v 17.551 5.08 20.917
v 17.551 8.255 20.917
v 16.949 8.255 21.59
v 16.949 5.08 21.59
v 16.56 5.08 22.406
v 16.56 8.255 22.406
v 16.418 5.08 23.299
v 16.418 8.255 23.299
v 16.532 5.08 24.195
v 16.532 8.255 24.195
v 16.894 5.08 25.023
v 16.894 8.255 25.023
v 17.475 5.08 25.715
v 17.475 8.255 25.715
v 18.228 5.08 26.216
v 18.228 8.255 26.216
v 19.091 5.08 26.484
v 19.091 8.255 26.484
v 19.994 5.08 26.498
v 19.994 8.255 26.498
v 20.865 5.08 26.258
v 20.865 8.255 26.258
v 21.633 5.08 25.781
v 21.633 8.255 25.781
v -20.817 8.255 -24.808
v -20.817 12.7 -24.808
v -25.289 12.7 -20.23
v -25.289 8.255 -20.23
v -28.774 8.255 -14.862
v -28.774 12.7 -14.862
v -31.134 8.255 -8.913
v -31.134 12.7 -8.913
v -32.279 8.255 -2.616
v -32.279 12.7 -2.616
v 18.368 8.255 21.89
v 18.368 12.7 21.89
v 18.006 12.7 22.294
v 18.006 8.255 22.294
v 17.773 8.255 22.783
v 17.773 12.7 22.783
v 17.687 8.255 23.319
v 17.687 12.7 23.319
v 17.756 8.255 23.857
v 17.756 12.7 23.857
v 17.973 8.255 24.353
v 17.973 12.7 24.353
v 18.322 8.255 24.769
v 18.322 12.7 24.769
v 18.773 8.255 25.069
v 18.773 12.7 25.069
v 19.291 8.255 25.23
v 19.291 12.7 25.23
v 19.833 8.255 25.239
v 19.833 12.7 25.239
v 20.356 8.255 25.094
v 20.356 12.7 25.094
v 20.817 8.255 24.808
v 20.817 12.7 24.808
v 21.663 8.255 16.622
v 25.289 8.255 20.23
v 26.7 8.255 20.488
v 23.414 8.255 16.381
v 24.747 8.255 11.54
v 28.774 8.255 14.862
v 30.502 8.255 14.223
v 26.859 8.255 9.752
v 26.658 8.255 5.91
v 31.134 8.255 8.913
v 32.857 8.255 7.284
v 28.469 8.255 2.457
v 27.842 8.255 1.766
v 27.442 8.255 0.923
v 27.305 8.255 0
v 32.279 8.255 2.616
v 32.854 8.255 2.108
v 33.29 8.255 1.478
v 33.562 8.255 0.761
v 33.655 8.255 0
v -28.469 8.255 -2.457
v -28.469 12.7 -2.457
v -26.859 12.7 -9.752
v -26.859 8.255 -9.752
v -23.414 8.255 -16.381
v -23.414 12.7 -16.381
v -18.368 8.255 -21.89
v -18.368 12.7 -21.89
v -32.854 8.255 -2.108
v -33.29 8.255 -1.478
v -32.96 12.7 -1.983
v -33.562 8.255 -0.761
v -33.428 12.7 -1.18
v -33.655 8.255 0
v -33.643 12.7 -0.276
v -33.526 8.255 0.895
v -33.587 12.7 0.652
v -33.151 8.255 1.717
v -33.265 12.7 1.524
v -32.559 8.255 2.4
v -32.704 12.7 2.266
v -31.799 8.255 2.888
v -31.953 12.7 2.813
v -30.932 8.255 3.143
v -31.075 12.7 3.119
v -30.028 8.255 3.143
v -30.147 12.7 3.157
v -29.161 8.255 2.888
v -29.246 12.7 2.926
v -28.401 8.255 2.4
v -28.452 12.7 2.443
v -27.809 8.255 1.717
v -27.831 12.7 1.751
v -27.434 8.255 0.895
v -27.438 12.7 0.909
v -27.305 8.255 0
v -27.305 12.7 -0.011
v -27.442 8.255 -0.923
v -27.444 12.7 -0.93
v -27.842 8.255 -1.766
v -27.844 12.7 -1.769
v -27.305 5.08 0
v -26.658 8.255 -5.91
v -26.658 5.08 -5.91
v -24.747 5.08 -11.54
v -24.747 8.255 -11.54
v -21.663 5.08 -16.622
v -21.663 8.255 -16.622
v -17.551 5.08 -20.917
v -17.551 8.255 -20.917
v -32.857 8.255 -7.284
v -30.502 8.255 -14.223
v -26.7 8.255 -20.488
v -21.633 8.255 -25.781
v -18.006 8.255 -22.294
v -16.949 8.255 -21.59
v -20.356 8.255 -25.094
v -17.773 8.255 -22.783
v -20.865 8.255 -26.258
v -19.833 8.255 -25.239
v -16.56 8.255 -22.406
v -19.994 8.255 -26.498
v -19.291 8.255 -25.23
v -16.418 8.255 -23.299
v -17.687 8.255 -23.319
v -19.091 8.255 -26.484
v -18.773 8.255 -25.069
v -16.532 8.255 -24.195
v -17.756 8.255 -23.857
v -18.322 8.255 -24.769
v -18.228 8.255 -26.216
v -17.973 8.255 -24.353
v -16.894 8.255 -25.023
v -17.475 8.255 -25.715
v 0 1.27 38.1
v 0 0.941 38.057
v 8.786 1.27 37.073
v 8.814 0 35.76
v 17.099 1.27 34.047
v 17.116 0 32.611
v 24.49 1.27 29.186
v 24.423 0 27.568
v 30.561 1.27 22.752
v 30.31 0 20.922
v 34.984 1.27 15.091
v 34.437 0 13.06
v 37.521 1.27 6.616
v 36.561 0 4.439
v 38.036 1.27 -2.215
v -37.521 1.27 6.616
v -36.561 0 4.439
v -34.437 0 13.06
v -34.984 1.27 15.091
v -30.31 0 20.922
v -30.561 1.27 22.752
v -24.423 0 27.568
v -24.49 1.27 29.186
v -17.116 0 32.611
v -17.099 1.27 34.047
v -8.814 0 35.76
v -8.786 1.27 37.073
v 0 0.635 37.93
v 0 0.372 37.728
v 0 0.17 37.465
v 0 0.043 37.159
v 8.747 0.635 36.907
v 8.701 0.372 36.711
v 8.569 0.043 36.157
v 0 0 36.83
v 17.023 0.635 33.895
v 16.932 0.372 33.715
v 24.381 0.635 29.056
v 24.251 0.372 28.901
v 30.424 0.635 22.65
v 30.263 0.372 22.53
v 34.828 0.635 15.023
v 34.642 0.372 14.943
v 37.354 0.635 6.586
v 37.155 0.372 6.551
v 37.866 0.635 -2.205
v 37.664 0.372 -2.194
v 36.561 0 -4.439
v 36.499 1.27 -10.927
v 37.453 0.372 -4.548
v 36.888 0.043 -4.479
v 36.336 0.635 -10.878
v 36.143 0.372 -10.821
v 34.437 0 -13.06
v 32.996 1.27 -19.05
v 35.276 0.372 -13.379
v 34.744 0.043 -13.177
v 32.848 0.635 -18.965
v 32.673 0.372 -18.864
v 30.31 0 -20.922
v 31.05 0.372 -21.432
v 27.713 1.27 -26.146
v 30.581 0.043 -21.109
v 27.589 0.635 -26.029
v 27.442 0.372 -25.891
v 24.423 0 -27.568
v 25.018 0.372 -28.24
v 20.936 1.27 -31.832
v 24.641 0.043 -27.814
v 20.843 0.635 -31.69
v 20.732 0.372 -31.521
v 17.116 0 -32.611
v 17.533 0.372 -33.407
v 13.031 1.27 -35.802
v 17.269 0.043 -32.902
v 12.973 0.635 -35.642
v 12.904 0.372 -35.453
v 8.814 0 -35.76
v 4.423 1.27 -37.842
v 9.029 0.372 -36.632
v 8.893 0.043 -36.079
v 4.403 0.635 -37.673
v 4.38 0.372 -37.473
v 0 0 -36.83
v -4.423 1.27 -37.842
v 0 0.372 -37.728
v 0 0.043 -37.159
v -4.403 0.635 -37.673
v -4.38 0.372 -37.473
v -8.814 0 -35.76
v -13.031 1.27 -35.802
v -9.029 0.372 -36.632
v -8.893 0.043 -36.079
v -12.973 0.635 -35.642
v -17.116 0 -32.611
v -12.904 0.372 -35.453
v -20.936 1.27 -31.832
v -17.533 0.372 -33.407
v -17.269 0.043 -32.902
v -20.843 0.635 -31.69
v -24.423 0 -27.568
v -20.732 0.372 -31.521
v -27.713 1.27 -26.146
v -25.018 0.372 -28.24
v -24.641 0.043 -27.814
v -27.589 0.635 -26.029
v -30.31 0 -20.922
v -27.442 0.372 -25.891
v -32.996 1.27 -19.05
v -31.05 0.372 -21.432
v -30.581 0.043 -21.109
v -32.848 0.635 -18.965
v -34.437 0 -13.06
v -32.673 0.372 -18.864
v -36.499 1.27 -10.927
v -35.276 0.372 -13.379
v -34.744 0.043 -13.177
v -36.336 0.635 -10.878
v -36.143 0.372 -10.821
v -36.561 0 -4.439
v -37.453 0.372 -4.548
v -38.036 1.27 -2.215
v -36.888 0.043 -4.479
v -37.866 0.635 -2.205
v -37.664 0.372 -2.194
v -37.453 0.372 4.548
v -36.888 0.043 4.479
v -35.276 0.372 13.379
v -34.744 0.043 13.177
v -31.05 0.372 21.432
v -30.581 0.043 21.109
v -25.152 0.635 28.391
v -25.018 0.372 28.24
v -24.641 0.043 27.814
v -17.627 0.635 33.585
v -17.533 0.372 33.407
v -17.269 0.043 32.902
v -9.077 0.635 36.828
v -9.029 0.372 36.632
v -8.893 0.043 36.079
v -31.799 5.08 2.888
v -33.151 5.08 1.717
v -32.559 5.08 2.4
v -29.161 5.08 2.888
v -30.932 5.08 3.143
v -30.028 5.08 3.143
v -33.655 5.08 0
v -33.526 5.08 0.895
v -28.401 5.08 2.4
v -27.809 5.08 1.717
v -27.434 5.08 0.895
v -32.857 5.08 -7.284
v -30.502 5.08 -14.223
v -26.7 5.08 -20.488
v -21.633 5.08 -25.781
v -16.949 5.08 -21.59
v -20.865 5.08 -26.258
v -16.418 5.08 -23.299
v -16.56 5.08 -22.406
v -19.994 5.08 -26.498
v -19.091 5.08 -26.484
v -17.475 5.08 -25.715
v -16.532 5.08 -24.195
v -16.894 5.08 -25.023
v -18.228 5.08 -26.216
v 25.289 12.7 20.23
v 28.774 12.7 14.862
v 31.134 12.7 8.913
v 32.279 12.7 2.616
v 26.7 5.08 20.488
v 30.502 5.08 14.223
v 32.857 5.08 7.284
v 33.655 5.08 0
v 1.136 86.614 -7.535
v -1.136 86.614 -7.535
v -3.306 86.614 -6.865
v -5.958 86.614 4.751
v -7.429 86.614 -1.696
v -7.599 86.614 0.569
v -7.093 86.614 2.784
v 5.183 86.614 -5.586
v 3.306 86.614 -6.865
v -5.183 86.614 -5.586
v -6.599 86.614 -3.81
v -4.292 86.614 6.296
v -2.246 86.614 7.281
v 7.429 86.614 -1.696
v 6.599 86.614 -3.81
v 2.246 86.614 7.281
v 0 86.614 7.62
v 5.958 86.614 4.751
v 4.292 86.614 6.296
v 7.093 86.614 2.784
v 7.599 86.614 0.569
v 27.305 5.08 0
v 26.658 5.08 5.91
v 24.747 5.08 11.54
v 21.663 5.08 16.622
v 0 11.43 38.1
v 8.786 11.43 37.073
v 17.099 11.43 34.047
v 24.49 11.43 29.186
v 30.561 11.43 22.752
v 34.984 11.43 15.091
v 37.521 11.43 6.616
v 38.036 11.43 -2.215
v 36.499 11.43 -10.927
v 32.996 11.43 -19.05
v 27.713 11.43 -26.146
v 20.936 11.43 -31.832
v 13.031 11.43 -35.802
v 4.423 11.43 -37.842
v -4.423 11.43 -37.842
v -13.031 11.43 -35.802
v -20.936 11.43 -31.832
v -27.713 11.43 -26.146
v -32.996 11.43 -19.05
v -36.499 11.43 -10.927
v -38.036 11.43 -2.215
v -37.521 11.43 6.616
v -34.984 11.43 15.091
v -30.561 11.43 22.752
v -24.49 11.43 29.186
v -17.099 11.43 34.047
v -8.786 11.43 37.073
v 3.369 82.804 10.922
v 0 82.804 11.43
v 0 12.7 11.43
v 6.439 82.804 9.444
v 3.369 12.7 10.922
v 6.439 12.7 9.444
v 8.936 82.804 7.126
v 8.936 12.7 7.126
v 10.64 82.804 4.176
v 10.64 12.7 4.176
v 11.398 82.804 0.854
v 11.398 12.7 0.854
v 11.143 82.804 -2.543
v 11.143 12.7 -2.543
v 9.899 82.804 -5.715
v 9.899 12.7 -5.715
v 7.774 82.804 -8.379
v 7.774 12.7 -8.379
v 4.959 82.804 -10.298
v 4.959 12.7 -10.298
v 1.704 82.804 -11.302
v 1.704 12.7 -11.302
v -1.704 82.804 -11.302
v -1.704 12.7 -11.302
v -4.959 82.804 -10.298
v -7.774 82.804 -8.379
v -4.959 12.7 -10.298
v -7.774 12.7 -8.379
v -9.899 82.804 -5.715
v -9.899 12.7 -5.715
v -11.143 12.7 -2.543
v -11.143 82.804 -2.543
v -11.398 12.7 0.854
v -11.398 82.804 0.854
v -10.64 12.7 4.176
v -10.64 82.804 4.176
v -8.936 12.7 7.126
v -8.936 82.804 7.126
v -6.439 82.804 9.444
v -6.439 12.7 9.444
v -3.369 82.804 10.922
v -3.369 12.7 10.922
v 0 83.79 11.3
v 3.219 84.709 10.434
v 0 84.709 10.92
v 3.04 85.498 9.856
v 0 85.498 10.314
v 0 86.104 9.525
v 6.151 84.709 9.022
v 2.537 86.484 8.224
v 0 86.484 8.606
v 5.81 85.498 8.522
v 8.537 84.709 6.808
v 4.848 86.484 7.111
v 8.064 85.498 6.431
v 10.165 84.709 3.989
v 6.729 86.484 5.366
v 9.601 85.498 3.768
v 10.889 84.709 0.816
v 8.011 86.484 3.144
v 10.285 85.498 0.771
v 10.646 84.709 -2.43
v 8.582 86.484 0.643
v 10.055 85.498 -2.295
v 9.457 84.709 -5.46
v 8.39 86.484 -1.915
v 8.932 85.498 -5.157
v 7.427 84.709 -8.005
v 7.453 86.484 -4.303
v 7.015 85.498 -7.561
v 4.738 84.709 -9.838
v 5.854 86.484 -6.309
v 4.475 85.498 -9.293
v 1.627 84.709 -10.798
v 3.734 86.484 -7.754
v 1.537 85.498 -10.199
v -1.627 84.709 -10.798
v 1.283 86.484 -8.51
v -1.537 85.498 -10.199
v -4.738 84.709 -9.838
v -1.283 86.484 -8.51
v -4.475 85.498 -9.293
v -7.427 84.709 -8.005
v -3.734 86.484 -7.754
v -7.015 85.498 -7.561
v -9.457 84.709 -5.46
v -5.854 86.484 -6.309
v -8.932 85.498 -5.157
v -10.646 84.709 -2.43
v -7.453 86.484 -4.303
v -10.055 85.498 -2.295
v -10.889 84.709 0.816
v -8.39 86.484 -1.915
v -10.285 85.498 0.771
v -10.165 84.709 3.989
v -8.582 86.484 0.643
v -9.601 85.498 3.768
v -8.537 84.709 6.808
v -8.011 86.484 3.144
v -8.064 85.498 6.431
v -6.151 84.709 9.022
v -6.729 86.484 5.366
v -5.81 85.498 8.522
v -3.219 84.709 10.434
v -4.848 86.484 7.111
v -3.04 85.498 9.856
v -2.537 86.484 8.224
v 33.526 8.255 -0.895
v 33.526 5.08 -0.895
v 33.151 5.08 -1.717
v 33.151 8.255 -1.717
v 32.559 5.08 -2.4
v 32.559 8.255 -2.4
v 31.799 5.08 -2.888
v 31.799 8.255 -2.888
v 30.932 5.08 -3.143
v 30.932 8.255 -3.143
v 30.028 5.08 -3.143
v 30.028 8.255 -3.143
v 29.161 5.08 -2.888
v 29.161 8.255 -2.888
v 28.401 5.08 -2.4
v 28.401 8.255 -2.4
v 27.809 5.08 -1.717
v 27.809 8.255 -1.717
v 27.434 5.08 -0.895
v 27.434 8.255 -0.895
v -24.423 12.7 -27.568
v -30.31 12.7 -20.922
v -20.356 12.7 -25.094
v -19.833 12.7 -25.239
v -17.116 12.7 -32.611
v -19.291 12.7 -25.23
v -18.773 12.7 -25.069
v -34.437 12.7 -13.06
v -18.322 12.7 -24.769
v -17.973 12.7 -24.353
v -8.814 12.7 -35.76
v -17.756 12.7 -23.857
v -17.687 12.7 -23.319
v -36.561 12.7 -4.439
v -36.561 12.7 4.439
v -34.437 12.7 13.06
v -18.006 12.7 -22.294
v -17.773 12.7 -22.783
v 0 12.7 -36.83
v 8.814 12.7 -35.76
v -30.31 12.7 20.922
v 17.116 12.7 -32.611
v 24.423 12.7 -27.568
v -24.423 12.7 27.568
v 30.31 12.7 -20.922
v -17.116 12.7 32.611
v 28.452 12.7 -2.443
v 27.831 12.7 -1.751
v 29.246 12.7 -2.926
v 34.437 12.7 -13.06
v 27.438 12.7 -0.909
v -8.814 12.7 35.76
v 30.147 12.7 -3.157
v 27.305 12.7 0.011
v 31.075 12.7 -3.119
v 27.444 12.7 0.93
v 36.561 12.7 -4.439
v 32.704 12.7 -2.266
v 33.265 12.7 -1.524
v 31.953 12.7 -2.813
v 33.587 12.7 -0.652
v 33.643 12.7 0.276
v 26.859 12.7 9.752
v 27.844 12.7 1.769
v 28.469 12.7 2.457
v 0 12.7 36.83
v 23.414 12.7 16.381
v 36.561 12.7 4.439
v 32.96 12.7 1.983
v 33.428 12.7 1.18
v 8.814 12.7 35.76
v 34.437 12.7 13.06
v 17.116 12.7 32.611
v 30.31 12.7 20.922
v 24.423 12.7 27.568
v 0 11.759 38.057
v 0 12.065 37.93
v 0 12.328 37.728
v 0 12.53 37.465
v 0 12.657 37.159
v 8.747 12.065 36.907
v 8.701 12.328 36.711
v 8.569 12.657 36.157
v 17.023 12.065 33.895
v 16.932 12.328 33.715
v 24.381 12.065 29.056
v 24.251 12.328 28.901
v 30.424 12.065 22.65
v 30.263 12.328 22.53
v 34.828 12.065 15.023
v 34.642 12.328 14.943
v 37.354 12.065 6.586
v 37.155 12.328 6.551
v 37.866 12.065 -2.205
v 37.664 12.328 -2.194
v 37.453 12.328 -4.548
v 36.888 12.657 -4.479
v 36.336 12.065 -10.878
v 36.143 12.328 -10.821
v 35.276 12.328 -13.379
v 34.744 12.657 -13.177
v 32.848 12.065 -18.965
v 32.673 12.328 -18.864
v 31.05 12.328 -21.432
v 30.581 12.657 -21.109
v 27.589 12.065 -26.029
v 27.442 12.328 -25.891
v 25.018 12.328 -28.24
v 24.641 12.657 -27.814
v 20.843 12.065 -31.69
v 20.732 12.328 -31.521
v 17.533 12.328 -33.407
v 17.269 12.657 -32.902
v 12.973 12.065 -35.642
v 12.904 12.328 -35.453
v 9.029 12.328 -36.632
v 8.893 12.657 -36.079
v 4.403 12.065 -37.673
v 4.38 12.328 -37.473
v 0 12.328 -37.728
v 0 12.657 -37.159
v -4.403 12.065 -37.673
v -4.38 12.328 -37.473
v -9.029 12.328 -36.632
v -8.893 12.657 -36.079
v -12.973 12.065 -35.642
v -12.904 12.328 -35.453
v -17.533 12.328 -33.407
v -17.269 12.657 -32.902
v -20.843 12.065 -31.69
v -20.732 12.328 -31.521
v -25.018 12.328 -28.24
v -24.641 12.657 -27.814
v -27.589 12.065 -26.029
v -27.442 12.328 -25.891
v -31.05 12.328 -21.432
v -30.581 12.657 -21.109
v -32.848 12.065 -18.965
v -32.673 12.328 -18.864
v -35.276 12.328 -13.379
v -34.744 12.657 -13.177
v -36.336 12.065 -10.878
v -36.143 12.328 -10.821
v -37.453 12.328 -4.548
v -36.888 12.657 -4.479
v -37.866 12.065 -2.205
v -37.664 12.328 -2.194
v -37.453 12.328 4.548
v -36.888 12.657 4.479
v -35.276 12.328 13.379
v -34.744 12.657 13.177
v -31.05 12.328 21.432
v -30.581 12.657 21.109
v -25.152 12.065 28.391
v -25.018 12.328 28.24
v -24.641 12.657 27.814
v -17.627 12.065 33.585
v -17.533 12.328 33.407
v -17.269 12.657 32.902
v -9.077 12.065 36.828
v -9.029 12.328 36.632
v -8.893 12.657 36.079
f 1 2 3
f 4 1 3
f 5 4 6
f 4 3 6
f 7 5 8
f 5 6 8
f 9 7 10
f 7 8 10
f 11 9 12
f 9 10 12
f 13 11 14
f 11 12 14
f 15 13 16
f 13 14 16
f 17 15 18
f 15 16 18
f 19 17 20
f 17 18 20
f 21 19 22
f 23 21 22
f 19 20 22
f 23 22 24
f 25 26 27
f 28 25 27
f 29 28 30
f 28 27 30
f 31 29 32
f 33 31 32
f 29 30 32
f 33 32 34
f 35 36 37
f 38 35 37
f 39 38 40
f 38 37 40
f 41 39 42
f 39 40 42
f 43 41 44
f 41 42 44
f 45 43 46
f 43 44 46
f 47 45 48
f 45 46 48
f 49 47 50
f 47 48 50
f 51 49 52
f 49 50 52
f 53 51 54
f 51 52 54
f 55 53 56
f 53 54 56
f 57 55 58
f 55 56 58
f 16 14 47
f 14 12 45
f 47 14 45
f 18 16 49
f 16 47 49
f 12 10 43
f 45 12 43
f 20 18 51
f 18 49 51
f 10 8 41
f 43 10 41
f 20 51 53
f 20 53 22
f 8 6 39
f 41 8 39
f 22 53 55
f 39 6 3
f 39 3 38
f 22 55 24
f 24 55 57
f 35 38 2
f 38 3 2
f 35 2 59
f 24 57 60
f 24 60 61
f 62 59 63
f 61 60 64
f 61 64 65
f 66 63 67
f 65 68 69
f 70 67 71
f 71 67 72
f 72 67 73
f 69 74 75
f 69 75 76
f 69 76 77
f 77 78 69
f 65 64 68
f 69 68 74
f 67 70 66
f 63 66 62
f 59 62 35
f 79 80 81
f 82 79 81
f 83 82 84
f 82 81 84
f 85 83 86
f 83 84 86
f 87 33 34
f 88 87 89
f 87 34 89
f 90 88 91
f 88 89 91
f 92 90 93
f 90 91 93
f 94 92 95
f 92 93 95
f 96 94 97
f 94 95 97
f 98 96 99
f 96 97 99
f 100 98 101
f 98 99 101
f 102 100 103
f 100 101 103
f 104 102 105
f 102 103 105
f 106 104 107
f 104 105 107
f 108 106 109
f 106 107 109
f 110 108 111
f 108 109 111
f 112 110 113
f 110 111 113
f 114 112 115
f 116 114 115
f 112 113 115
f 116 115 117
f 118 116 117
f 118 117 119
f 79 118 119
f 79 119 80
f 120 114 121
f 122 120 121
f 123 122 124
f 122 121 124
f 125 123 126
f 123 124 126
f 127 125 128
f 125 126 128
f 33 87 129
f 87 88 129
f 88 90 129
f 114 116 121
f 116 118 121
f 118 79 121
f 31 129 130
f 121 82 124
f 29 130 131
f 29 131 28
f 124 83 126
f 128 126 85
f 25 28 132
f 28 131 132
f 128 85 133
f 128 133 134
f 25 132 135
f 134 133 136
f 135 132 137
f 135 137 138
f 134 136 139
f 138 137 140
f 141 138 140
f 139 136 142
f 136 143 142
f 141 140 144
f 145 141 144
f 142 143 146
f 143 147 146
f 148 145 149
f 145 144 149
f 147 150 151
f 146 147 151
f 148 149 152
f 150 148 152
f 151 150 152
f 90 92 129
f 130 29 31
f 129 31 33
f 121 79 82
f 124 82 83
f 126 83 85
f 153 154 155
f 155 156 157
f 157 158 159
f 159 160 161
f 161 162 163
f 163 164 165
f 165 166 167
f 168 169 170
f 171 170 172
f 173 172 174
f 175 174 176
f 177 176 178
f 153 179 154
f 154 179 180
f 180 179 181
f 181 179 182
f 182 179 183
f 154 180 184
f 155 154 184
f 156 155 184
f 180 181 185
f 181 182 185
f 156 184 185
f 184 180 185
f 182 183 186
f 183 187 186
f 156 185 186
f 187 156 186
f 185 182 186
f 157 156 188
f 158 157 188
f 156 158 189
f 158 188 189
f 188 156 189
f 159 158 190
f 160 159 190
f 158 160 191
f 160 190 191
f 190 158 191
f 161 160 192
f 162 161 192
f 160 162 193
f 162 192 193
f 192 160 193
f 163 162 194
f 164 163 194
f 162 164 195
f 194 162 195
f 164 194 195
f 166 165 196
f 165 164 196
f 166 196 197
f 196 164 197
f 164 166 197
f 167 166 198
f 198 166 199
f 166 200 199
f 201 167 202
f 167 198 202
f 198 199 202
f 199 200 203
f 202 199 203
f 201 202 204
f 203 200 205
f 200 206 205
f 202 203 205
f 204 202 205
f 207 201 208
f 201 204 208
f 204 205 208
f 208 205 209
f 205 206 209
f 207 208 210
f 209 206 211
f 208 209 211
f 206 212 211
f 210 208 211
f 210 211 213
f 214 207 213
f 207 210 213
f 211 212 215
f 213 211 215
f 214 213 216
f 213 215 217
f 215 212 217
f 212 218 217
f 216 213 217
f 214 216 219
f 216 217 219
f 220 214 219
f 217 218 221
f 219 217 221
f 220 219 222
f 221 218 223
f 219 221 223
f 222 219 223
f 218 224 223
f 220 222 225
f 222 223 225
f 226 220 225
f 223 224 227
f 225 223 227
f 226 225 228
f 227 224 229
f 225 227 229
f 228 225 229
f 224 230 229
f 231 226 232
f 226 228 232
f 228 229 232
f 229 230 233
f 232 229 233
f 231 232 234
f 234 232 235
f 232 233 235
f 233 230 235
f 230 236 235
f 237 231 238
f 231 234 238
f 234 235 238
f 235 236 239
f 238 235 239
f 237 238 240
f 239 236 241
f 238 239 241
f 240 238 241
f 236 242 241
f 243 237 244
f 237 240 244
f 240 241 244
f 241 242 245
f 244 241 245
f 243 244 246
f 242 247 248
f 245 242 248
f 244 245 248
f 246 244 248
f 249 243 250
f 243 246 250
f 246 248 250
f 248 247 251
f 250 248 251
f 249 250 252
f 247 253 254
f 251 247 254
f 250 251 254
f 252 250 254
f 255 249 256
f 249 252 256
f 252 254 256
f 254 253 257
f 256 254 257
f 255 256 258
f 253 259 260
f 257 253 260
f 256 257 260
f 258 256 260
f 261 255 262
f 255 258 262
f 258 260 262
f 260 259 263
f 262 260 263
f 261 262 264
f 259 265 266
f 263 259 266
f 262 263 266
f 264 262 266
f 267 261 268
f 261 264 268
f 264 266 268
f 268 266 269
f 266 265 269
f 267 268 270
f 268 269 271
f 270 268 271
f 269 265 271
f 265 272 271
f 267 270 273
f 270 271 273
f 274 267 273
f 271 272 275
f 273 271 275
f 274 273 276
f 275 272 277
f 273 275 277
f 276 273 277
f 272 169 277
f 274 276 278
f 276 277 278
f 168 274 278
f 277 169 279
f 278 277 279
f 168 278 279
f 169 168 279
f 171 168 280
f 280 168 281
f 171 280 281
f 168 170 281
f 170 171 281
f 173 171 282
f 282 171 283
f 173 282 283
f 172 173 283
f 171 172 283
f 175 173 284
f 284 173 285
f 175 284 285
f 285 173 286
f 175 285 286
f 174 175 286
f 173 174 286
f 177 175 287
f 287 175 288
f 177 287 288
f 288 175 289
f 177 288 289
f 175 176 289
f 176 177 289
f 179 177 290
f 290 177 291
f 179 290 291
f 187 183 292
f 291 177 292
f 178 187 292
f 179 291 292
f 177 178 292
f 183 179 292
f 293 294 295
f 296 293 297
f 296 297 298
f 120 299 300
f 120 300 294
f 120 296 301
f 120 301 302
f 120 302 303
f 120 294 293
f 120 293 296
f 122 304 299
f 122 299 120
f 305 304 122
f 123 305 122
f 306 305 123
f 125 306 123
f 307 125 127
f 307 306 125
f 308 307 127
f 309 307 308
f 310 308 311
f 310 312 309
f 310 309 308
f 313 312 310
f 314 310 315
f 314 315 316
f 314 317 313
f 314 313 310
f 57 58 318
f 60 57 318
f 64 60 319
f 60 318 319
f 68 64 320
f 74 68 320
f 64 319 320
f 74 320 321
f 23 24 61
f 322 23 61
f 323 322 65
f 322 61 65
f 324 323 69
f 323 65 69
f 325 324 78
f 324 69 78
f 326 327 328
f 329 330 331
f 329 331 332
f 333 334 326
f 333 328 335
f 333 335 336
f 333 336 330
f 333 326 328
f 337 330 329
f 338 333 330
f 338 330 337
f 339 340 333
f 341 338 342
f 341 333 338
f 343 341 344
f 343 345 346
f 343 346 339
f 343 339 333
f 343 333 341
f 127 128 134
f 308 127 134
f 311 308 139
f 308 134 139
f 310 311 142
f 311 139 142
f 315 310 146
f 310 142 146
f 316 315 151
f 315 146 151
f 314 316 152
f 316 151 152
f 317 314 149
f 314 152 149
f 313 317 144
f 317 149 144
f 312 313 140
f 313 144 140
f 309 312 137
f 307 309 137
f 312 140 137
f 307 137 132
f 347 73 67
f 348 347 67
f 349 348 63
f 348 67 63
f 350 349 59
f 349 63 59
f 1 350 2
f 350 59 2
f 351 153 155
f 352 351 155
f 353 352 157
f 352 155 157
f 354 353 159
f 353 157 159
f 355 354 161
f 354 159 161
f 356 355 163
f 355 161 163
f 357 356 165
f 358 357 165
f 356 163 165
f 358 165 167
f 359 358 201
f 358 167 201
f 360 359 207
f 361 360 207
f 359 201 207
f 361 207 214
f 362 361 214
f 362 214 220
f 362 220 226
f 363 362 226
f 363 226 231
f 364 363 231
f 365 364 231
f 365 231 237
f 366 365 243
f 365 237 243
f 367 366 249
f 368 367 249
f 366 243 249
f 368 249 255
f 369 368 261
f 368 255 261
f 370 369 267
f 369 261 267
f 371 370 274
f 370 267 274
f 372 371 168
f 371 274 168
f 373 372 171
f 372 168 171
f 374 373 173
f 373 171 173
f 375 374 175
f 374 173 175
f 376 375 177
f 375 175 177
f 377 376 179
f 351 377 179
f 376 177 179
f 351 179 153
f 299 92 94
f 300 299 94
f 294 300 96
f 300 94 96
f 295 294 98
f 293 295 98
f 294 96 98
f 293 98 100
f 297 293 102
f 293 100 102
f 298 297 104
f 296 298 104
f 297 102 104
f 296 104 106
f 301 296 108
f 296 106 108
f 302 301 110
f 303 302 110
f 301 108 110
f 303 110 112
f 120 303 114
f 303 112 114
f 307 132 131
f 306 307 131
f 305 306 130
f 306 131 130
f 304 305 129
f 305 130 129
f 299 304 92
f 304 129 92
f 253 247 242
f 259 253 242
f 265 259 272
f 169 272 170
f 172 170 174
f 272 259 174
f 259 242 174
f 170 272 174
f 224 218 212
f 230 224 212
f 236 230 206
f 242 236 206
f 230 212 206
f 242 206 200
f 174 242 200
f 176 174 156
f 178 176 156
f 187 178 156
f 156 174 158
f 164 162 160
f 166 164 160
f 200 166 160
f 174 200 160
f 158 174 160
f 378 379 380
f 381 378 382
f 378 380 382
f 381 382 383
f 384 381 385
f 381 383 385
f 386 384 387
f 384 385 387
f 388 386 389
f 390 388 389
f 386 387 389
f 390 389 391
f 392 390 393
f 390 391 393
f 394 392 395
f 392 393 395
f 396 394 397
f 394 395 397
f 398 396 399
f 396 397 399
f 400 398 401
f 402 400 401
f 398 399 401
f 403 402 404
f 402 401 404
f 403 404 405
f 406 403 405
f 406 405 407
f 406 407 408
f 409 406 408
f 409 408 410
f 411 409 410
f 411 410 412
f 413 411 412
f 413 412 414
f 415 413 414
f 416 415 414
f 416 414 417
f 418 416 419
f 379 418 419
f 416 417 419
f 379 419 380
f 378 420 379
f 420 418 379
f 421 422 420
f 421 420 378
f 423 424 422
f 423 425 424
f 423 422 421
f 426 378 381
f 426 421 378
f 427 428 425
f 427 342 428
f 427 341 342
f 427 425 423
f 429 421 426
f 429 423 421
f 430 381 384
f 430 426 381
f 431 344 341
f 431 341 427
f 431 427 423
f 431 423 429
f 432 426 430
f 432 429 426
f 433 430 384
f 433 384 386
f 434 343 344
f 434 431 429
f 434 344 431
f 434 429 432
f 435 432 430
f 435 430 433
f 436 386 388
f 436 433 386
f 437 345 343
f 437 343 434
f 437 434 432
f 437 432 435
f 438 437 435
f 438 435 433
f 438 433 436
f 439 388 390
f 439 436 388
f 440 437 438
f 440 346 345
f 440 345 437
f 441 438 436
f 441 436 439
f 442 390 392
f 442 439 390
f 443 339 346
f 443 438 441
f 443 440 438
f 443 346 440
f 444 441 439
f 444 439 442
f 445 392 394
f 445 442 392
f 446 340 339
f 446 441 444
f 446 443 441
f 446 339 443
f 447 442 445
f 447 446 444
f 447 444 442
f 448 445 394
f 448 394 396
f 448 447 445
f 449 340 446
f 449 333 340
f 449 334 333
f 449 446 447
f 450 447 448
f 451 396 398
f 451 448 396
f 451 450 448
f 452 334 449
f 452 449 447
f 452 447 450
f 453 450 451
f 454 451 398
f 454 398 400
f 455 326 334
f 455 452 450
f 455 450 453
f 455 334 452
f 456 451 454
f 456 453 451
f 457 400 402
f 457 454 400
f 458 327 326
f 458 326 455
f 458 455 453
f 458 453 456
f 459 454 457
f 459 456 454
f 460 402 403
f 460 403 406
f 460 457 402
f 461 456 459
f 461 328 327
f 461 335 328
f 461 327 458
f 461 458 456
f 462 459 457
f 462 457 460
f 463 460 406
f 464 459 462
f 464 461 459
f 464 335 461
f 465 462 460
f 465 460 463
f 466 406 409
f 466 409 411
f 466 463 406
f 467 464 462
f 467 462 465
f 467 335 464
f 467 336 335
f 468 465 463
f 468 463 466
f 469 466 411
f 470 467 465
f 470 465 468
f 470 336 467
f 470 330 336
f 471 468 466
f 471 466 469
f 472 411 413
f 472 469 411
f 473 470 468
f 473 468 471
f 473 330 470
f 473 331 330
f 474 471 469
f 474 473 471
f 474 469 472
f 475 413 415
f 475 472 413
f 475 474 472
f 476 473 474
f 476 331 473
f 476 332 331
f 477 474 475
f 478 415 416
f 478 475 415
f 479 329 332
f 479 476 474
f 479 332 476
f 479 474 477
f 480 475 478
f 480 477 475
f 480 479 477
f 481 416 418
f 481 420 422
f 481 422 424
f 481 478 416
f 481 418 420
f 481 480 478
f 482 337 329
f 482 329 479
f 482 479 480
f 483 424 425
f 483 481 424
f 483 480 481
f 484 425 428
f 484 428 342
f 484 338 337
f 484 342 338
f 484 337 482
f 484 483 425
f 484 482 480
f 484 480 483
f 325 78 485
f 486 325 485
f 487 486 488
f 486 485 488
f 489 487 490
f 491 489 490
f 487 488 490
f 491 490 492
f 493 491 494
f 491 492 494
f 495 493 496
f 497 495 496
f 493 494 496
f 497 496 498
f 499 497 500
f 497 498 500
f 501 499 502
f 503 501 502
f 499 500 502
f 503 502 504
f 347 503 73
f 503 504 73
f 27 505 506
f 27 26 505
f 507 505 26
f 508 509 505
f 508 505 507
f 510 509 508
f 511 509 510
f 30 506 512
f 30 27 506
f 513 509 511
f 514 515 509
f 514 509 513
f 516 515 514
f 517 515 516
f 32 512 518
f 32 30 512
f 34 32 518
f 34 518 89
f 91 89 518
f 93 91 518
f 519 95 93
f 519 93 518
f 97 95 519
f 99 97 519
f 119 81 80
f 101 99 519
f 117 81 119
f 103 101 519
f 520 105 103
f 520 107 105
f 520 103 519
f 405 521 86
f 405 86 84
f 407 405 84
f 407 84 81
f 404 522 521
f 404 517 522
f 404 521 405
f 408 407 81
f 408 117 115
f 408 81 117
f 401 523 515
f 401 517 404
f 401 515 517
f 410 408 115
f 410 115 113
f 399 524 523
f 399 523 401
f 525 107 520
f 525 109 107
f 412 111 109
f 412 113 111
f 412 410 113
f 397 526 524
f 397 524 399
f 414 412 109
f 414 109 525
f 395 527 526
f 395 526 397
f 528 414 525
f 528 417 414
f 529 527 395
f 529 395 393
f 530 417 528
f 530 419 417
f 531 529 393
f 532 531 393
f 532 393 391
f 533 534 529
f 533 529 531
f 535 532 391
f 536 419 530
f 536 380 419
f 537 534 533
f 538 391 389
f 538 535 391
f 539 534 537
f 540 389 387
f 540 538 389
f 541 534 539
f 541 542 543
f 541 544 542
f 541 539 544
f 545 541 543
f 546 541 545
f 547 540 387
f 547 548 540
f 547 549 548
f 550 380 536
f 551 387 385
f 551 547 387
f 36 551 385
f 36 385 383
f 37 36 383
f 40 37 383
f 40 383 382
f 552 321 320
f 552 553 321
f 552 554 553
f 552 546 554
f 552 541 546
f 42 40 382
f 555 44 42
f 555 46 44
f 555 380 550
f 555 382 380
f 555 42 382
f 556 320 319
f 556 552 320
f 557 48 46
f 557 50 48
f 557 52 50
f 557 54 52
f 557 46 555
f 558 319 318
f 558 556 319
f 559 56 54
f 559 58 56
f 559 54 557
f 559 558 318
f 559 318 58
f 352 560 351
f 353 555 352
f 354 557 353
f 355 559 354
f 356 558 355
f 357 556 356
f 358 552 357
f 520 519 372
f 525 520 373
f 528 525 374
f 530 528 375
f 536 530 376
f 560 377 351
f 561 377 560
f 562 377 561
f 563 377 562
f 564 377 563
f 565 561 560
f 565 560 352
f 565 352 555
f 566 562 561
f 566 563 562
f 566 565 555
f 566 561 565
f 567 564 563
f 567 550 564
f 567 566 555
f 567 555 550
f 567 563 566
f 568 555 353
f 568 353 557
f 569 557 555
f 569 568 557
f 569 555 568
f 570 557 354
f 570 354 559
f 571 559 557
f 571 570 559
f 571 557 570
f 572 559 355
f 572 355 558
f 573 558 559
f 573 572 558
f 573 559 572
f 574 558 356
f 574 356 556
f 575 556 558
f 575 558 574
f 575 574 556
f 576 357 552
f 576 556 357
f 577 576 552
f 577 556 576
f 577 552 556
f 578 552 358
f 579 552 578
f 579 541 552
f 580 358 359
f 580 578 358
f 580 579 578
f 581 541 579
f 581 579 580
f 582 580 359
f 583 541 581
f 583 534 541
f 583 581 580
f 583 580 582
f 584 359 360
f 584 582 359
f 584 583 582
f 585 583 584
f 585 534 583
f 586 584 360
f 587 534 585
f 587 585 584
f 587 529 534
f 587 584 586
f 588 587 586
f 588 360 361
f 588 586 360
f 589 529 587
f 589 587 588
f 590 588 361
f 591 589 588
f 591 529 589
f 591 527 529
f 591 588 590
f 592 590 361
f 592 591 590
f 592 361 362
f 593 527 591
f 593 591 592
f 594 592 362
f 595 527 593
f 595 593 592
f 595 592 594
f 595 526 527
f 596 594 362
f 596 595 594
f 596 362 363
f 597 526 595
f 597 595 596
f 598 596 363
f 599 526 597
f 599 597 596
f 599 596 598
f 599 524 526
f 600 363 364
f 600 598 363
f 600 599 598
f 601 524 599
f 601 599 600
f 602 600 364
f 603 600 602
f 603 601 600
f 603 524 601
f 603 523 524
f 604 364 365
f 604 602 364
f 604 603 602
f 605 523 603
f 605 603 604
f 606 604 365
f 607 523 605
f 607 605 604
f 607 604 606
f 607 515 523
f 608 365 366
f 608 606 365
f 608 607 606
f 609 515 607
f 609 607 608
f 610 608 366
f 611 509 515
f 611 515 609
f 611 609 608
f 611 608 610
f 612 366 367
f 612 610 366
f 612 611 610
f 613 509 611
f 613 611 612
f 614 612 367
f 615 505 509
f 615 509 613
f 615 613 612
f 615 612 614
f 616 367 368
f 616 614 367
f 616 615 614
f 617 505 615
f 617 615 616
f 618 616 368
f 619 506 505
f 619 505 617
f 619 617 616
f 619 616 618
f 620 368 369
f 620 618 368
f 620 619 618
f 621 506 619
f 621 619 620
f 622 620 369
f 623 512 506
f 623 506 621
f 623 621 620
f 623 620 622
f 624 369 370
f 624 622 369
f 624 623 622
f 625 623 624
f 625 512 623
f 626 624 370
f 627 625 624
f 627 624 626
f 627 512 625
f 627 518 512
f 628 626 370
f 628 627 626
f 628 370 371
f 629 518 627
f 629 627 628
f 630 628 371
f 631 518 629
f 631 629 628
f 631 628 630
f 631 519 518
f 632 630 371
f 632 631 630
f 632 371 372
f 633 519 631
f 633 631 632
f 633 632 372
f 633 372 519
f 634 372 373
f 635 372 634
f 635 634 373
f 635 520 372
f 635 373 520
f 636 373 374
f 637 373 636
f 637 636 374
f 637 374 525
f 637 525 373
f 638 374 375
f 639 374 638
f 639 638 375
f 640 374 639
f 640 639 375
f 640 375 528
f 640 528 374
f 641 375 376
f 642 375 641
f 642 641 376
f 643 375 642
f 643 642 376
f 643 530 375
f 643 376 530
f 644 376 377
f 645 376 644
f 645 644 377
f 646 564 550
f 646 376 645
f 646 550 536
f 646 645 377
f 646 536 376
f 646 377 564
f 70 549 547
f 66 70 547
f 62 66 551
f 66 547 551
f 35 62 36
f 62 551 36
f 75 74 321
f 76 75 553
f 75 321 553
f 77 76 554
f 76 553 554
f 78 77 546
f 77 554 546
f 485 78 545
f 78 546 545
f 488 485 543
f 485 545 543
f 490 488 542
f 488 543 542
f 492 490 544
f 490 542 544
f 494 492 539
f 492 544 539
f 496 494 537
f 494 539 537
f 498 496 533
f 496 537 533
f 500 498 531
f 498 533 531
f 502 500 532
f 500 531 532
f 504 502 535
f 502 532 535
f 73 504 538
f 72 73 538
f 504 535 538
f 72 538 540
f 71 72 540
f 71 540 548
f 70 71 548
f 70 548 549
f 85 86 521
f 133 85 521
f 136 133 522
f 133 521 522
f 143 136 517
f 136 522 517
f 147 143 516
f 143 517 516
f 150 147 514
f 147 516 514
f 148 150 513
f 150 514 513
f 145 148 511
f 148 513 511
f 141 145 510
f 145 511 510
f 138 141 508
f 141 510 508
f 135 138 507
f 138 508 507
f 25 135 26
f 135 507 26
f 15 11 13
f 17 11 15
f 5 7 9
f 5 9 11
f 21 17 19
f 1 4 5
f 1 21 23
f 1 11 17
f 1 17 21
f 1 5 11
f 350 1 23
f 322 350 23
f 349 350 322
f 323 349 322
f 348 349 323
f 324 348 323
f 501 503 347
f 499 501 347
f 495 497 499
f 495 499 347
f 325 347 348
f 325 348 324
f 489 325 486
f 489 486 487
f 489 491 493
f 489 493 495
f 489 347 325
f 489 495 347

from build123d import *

# Parameters (mm, degrees)
SKETCH1_R           = 38.1
BOSS_EXTRUDE1_DEPTH = 12.7
SKETCH2_R           = 11.43
BOSS_EXTRUDE2_DEPTH = 73.914
FILLET1_R           = 1.27
FILLET2_R           = 1.27
FILLET3_R           = 3.81
CUT_EXTRUDE1_DEPTH  = 4.445
CUT_EXTRUDE2_DEPTH  = 3.175


with BuildPart() as part:
    # Sketch1 → Boss-Extrude1 (new body)
    with BuildSketch(Plane(origin=(0, 0, 0), x_dir=(1, 0, 0), z_dir=(0, 1, 0))):
        with Locations(Location((0, 0, 0), (0, 0, 270))):
            Circle(SKETCH1_R)
    extrude(amount=BOSS_EXTRUDE1_DEPTH)

    # Sketch2 → Boss-Extrude2 (add)
    with BuildSketch(Plane(origin=(0, 12.7, 0), x_dir=(1, 0, 0), z_dir=(0, 1, 0))):
        with Locations(Location((0, 0, 0), (0, 0, 270))):
            Circle(SKETCH2_R)
    extrude(amount=BOSS_EXTRUDE2_DEPTH)

    # Fillet1
    fillet1_edges = [part.edges().sort_by_distance(p)[0] for p in [
        (0, 12.7, -38.1),
    ]]
    fillet(fillet1_edges, radius=FILLET1_R)

    # Fillet2
    fillet2_edges = [part.edges().sort_by_distance(p)[0] for p in [
        (0, 0, -38.1),
    ]]
    fillet(fillet2_edges, radius=FILLET2_R)

    # Fillet3
    fillet3_edges = [part.edges().sort_by_distance(p)[0] for p in [
        (0, 86.614, -11.43),
    ]]
    fillet(fillet3_edges, radius=FILLET3_R)

    # Sketch4 → Cut-Extrude1 (cut)
    with BuildSketch(Plane(origin=(0, 12.7, 0), x_dir=(1, 0, 0), z_dir=(0, 1, 0))):
        with BuildLine():
            ThreePointArc((-32.279166667, 2.616032168), (-30.612356486, -3.172240023), (-28.469166667, 2.457066199))
            ThreePointArc((-28.469166667, 2.457066199), (-25.354072576, 13.179591374), (-18.367655947, 21.889719962))
            ThreePointArc((-18.367655947, 21.889719962), (-18.132851679, 24.573545023), (-20.81667674, 24.80834929))
            ThreePointArc((-20.81667674, 24.80834929), (-28.773544821, 14.861740929), (-32.279166667, 2.616032168))
        make_face()
        with BuildLine():
            ThreePointArc((32.279166667, -2.616032168), (30.612356486, 3.172240023), (28.469166667, -2.457066199))
            ThreePointArc((28.469166667, -2.457066199), (25.354072576, -13.179591374), (18.367655947, -21.889719962))
            ThreePointArc((18.367655947, -21.889719962), (18.132851679, -24.573545023), (20.81667674, -24.80834929))
            ThreePointArc((20.81667674, -24.80834929), (28.773544821, -14.861740929), (32.279166667, -2.616032168))
        make_face()
    extrude(amount=-CUT_EXTRUDE1_DEPTH, mode=Mode.SUBTRACT)

    # Sketch5 → Cut-Extrude2 (cut)
    with BuildSketch(Plane(origin=(0, 8.255, 0), x_dir=(1, 0, 0), z_dir=(0, 1, 0))):
        with BuildLine():
            ThreePointArc((-21.633017004, 25.781225733), (-30.501788573, 14.223217599), (-33.655, 0))
            ThreePointArc((-33.655, 0), (-30.48, -3.175), (-27.305, 0))
            ThreePointArc((-27.305, 0), (-24.746734125, 11.539591637), (-17.551315682, 20.916843519))
            ThreePointArc((-17.551315682, 20.916843519), (-17.159975236, 25.389885287), (-21.633017004, 25.781225733))
        make_face()
        with BuildLine():
            ThreePointArc((33.655, 0), (30.48, 3.175), (27.305, 0))
            ThreePointArc((27.305, 0), (24.746734125, -11.539591637), (17.551315682, -20.916843519))
            ThreePointArc((17.551315682, -20.916843519), (17.159975236, -25.389885287), (21.633017004, -25.781225733))
            ThreePointArc((21.633017004, -25.781225733), (30.501788573, -14.223217599), (33.655, 0))
        make_face()
    extrude(amount=-CUT_EXTRUDE2_DEPTH, mode=Mode.SUBTRACT)


solid = part.part
